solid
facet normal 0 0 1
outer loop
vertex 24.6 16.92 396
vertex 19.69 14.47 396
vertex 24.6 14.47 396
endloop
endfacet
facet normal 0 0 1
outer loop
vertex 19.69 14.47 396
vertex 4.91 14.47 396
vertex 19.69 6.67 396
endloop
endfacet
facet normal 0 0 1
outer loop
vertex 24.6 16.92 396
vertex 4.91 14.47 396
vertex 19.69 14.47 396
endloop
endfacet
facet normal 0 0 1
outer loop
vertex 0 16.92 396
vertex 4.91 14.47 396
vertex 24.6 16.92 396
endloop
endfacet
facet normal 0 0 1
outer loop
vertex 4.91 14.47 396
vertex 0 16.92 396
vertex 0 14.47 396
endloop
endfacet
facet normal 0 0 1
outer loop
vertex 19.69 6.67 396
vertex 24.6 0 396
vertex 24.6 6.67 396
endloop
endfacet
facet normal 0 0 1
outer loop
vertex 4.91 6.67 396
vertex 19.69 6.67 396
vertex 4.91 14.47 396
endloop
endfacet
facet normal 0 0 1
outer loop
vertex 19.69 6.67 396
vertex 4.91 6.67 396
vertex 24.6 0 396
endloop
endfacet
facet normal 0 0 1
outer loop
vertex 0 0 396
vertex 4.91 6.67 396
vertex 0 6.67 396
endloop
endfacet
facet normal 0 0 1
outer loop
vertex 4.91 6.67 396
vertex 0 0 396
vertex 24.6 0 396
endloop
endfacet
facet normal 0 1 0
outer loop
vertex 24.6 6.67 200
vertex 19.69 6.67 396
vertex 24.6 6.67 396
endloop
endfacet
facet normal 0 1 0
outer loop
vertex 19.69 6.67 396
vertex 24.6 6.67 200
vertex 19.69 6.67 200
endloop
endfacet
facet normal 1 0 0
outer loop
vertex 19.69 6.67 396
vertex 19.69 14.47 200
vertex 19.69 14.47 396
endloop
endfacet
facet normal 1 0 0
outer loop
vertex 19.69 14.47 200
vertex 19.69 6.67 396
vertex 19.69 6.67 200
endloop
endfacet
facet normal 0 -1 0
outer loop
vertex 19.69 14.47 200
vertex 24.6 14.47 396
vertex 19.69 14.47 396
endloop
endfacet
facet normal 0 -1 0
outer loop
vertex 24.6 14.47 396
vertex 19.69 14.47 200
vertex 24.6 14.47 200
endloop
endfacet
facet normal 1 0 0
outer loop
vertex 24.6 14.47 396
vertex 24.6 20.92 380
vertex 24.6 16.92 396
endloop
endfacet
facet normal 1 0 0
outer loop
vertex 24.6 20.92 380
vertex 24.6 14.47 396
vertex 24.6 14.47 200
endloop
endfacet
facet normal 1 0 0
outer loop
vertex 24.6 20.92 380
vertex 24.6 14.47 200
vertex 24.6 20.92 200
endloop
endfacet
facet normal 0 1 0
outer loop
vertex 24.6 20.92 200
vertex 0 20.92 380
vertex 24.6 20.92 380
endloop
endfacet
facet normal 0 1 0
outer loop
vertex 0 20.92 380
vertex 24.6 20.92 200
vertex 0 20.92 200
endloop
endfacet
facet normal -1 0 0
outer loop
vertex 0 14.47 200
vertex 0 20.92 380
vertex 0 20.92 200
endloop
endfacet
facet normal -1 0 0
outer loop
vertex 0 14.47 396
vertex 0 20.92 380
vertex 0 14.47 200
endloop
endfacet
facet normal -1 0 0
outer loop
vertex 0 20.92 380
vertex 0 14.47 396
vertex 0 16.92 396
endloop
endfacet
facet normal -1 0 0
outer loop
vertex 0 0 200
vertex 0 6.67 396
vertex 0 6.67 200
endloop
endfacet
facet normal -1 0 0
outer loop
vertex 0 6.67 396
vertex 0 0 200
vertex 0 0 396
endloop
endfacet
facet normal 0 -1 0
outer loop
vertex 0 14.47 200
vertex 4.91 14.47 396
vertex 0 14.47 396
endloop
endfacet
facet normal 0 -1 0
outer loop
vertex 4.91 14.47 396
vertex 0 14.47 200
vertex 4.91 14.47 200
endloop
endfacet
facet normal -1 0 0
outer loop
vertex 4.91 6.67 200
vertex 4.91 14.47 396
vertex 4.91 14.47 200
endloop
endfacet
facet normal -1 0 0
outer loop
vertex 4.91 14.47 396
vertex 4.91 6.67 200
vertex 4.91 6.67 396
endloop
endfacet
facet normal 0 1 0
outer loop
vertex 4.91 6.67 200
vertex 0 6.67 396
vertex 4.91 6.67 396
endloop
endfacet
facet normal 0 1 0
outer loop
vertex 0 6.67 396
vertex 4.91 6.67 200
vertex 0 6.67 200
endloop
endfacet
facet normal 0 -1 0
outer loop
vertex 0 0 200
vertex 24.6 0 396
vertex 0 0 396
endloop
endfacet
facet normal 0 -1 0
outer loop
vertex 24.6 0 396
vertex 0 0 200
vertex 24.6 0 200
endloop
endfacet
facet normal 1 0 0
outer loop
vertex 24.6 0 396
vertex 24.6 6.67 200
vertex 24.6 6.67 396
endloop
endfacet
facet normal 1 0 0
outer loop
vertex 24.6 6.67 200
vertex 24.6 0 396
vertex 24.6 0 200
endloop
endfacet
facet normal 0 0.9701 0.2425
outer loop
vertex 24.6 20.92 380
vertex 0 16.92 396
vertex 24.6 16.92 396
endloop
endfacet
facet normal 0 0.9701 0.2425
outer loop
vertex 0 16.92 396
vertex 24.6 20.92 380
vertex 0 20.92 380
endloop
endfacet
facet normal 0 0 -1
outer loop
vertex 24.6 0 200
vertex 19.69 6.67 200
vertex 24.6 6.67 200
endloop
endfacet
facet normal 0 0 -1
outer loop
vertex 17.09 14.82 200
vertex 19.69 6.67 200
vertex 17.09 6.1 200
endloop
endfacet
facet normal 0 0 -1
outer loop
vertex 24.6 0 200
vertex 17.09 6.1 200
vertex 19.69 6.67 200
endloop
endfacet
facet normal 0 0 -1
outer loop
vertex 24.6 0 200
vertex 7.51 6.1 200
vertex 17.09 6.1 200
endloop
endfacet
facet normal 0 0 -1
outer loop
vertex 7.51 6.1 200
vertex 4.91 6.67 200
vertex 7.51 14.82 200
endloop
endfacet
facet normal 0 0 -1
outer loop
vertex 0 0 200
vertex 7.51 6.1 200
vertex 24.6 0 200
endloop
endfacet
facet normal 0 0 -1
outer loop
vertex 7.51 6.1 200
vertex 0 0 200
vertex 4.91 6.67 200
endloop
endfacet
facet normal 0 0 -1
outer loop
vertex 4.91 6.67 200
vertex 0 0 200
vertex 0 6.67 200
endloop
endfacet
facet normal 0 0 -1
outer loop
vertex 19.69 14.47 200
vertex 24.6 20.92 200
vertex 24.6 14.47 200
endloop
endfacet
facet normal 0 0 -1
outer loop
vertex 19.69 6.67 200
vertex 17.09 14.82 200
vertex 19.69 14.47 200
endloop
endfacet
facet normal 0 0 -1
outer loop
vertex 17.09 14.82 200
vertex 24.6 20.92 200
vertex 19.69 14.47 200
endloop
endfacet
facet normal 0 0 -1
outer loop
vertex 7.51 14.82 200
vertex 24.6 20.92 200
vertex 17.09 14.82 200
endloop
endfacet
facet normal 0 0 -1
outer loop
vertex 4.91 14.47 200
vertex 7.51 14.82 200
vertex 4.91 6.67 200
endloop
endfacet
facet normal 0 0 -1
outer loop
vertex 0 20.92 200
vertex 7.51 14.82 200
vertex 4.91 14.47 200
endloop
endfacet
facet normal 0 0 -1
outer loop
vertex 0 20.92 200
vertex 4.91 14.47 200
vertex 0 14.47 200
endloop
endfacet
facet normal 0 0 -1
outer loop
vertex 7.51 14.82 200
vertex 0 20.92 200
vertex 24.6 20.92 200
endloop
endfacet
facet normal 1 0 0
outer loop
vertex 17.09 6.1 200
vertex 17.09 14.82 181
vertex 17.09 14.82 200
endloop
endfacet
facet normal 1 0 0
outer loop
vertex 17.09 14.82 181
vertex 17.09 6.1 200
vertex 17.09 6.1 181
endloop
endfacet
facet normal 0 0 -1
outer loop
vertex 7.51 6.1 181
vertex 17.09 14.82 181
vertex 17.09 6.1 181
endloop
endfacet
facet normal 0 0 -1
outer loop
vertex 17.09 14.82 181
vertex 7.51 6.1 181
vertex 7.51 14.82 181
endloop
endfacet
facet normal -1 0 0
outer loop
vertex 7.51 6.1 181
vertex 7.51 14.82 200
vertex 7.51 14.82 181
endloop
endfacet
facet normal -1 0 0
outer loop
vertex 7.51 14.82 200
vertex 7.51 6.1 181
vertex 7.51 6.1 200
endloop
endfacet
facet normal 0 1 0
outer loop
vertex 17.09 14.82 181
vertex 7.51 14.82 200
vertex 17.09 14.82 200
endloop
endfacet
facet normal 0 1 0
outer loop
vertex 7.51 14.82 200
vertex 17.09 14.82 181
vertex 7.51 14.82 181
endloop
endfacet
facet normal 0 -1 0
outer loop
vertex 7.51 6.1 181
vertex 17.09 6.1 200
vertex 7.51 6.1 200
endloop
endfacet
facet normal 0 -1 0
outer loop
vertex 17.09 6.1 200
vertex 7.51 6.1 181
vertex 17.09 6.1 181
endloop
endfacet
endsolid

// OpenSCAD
LOWER_NOTCH_HEIGHT = 6.67;
MIDDLE_NOTCH_HEIGHT = 7.8;
UPPER_NOTCH_HEIGHT = 6.45;

NOTCH_WIDTH = 4.91;

RAIL_HEIGHT = LOWER_NOTCH_HEIGHT + MIDDLE_NOTCH_HEIGHT + UPPER_NOTCH_HEIGHT;

RAIL_WIDTH = 24.6;

RAIL_LENGTH = 396;

FRONT_LEN = 200;

module cross_section() {
    polygon([
            [0, 0],
            [0, LOWER_NOTCH_HEIGHT],
            [NOTCH_WIDTH, LOWER_NOTCH_HEIGHT],
            [NOTCH_WIDTH, LOWER_NOTCH_HEIGHT + MIDDLE_NOTCH_HEIGHT],
            [0, LOWER_NOTCH_HEIGHT + MIDDLE_NOTCH_HEIGHT],
            [0, RAIL_HEIGHT],
            [RAIL_WIDTH, RAIL_HEIGHT],
            [RAIL_WIDTH, LOWER_NOTCH_HEIGHT + MIDDLE_NOTCH_HEIGHT],
            [RAIL_WIDTH - NOTCH_WIDTH, LOWER_NOTCH_HEIGHT + MIDDLE_NOTCH_HEIGHT],
            [RAIL_WIDTH - NOTCH_WIDTH, LOWER_NOTCH_HEIGHT],
            [RAIL_WIDTH, LOWER_NOTCH_HEIGHT],
            [RAIL_WIDTH, 0],
    ]);
}

module back_cross_section() {
    polygon([
        [NOTCH_WIDTH, 8.15],
        [NOTCH_WIDTH, 8.15 + 9.8],
        [RAIL_WIDTH - NOTCH_WIDTH, 8.15 + 9.8],
        [RAIL_WIDTH - NOTCH_WIDTH, 8.15],
    ]);
}


module full_rail() {
    difference() {
        linear_extrude(height=RAIL_LENGTH) {cross_section();};
        color("green") translate([0, RAIL_HEIGHT, 380]) rotate([atan(3.5/14), 0, 0]) cube([RAIL_WIDTH, 10, 30]);
    }
    
    difference() {
        translate([0, 0, -18.76]) linear_extrude(height=18.76) {back_cross_section();};
        color("blue") translate([16, 0, -9.25]) rotate([90, 0, 0]) cylinder(h=50, r=2, center=true);
    }
    
}


module male_peg() {
    z_depth = 19;
    translate([RAIL_WIDTH / 2, RAIL_HEIGHT / 2, FRONT_LEN - z_depth/2]) cube([RAIL_WIDTH - NOTCH_WIDTH*2 - 5 - .2, RAIL_HEIGHT-12 -.2, z_depth], center=true);
}

module female_hole() {
    z_depth = 20;
    translate([RAIL_WIDTH / 2, RAIL_HEIGHT / 2, FRONT_LEN - z_depth/2]) cube([RAIL_WIDTH - NOTCH_WIDTH*2 - 5, RAIL_HEIGHT-12, z_depth], center=true);
}


module back_rail() {
    difference() {
        full_rail();
        translate([0, 0, -40]) color("purple") cube([50, 50, FRONT_LEN + 40]);   
    }
    male_peg();

}

module front_rail() {
    difference() {
        full_rail();
        translate([0, 0, FRONT_LEN]) color("purple") cube([50, 50, 300]);   
        female_hole();

    }

}

//full_rail();
back_rail();
//front_rail();

//difference() {
//color("pink") female_hole();
//color("blue") male_peg();
//}
